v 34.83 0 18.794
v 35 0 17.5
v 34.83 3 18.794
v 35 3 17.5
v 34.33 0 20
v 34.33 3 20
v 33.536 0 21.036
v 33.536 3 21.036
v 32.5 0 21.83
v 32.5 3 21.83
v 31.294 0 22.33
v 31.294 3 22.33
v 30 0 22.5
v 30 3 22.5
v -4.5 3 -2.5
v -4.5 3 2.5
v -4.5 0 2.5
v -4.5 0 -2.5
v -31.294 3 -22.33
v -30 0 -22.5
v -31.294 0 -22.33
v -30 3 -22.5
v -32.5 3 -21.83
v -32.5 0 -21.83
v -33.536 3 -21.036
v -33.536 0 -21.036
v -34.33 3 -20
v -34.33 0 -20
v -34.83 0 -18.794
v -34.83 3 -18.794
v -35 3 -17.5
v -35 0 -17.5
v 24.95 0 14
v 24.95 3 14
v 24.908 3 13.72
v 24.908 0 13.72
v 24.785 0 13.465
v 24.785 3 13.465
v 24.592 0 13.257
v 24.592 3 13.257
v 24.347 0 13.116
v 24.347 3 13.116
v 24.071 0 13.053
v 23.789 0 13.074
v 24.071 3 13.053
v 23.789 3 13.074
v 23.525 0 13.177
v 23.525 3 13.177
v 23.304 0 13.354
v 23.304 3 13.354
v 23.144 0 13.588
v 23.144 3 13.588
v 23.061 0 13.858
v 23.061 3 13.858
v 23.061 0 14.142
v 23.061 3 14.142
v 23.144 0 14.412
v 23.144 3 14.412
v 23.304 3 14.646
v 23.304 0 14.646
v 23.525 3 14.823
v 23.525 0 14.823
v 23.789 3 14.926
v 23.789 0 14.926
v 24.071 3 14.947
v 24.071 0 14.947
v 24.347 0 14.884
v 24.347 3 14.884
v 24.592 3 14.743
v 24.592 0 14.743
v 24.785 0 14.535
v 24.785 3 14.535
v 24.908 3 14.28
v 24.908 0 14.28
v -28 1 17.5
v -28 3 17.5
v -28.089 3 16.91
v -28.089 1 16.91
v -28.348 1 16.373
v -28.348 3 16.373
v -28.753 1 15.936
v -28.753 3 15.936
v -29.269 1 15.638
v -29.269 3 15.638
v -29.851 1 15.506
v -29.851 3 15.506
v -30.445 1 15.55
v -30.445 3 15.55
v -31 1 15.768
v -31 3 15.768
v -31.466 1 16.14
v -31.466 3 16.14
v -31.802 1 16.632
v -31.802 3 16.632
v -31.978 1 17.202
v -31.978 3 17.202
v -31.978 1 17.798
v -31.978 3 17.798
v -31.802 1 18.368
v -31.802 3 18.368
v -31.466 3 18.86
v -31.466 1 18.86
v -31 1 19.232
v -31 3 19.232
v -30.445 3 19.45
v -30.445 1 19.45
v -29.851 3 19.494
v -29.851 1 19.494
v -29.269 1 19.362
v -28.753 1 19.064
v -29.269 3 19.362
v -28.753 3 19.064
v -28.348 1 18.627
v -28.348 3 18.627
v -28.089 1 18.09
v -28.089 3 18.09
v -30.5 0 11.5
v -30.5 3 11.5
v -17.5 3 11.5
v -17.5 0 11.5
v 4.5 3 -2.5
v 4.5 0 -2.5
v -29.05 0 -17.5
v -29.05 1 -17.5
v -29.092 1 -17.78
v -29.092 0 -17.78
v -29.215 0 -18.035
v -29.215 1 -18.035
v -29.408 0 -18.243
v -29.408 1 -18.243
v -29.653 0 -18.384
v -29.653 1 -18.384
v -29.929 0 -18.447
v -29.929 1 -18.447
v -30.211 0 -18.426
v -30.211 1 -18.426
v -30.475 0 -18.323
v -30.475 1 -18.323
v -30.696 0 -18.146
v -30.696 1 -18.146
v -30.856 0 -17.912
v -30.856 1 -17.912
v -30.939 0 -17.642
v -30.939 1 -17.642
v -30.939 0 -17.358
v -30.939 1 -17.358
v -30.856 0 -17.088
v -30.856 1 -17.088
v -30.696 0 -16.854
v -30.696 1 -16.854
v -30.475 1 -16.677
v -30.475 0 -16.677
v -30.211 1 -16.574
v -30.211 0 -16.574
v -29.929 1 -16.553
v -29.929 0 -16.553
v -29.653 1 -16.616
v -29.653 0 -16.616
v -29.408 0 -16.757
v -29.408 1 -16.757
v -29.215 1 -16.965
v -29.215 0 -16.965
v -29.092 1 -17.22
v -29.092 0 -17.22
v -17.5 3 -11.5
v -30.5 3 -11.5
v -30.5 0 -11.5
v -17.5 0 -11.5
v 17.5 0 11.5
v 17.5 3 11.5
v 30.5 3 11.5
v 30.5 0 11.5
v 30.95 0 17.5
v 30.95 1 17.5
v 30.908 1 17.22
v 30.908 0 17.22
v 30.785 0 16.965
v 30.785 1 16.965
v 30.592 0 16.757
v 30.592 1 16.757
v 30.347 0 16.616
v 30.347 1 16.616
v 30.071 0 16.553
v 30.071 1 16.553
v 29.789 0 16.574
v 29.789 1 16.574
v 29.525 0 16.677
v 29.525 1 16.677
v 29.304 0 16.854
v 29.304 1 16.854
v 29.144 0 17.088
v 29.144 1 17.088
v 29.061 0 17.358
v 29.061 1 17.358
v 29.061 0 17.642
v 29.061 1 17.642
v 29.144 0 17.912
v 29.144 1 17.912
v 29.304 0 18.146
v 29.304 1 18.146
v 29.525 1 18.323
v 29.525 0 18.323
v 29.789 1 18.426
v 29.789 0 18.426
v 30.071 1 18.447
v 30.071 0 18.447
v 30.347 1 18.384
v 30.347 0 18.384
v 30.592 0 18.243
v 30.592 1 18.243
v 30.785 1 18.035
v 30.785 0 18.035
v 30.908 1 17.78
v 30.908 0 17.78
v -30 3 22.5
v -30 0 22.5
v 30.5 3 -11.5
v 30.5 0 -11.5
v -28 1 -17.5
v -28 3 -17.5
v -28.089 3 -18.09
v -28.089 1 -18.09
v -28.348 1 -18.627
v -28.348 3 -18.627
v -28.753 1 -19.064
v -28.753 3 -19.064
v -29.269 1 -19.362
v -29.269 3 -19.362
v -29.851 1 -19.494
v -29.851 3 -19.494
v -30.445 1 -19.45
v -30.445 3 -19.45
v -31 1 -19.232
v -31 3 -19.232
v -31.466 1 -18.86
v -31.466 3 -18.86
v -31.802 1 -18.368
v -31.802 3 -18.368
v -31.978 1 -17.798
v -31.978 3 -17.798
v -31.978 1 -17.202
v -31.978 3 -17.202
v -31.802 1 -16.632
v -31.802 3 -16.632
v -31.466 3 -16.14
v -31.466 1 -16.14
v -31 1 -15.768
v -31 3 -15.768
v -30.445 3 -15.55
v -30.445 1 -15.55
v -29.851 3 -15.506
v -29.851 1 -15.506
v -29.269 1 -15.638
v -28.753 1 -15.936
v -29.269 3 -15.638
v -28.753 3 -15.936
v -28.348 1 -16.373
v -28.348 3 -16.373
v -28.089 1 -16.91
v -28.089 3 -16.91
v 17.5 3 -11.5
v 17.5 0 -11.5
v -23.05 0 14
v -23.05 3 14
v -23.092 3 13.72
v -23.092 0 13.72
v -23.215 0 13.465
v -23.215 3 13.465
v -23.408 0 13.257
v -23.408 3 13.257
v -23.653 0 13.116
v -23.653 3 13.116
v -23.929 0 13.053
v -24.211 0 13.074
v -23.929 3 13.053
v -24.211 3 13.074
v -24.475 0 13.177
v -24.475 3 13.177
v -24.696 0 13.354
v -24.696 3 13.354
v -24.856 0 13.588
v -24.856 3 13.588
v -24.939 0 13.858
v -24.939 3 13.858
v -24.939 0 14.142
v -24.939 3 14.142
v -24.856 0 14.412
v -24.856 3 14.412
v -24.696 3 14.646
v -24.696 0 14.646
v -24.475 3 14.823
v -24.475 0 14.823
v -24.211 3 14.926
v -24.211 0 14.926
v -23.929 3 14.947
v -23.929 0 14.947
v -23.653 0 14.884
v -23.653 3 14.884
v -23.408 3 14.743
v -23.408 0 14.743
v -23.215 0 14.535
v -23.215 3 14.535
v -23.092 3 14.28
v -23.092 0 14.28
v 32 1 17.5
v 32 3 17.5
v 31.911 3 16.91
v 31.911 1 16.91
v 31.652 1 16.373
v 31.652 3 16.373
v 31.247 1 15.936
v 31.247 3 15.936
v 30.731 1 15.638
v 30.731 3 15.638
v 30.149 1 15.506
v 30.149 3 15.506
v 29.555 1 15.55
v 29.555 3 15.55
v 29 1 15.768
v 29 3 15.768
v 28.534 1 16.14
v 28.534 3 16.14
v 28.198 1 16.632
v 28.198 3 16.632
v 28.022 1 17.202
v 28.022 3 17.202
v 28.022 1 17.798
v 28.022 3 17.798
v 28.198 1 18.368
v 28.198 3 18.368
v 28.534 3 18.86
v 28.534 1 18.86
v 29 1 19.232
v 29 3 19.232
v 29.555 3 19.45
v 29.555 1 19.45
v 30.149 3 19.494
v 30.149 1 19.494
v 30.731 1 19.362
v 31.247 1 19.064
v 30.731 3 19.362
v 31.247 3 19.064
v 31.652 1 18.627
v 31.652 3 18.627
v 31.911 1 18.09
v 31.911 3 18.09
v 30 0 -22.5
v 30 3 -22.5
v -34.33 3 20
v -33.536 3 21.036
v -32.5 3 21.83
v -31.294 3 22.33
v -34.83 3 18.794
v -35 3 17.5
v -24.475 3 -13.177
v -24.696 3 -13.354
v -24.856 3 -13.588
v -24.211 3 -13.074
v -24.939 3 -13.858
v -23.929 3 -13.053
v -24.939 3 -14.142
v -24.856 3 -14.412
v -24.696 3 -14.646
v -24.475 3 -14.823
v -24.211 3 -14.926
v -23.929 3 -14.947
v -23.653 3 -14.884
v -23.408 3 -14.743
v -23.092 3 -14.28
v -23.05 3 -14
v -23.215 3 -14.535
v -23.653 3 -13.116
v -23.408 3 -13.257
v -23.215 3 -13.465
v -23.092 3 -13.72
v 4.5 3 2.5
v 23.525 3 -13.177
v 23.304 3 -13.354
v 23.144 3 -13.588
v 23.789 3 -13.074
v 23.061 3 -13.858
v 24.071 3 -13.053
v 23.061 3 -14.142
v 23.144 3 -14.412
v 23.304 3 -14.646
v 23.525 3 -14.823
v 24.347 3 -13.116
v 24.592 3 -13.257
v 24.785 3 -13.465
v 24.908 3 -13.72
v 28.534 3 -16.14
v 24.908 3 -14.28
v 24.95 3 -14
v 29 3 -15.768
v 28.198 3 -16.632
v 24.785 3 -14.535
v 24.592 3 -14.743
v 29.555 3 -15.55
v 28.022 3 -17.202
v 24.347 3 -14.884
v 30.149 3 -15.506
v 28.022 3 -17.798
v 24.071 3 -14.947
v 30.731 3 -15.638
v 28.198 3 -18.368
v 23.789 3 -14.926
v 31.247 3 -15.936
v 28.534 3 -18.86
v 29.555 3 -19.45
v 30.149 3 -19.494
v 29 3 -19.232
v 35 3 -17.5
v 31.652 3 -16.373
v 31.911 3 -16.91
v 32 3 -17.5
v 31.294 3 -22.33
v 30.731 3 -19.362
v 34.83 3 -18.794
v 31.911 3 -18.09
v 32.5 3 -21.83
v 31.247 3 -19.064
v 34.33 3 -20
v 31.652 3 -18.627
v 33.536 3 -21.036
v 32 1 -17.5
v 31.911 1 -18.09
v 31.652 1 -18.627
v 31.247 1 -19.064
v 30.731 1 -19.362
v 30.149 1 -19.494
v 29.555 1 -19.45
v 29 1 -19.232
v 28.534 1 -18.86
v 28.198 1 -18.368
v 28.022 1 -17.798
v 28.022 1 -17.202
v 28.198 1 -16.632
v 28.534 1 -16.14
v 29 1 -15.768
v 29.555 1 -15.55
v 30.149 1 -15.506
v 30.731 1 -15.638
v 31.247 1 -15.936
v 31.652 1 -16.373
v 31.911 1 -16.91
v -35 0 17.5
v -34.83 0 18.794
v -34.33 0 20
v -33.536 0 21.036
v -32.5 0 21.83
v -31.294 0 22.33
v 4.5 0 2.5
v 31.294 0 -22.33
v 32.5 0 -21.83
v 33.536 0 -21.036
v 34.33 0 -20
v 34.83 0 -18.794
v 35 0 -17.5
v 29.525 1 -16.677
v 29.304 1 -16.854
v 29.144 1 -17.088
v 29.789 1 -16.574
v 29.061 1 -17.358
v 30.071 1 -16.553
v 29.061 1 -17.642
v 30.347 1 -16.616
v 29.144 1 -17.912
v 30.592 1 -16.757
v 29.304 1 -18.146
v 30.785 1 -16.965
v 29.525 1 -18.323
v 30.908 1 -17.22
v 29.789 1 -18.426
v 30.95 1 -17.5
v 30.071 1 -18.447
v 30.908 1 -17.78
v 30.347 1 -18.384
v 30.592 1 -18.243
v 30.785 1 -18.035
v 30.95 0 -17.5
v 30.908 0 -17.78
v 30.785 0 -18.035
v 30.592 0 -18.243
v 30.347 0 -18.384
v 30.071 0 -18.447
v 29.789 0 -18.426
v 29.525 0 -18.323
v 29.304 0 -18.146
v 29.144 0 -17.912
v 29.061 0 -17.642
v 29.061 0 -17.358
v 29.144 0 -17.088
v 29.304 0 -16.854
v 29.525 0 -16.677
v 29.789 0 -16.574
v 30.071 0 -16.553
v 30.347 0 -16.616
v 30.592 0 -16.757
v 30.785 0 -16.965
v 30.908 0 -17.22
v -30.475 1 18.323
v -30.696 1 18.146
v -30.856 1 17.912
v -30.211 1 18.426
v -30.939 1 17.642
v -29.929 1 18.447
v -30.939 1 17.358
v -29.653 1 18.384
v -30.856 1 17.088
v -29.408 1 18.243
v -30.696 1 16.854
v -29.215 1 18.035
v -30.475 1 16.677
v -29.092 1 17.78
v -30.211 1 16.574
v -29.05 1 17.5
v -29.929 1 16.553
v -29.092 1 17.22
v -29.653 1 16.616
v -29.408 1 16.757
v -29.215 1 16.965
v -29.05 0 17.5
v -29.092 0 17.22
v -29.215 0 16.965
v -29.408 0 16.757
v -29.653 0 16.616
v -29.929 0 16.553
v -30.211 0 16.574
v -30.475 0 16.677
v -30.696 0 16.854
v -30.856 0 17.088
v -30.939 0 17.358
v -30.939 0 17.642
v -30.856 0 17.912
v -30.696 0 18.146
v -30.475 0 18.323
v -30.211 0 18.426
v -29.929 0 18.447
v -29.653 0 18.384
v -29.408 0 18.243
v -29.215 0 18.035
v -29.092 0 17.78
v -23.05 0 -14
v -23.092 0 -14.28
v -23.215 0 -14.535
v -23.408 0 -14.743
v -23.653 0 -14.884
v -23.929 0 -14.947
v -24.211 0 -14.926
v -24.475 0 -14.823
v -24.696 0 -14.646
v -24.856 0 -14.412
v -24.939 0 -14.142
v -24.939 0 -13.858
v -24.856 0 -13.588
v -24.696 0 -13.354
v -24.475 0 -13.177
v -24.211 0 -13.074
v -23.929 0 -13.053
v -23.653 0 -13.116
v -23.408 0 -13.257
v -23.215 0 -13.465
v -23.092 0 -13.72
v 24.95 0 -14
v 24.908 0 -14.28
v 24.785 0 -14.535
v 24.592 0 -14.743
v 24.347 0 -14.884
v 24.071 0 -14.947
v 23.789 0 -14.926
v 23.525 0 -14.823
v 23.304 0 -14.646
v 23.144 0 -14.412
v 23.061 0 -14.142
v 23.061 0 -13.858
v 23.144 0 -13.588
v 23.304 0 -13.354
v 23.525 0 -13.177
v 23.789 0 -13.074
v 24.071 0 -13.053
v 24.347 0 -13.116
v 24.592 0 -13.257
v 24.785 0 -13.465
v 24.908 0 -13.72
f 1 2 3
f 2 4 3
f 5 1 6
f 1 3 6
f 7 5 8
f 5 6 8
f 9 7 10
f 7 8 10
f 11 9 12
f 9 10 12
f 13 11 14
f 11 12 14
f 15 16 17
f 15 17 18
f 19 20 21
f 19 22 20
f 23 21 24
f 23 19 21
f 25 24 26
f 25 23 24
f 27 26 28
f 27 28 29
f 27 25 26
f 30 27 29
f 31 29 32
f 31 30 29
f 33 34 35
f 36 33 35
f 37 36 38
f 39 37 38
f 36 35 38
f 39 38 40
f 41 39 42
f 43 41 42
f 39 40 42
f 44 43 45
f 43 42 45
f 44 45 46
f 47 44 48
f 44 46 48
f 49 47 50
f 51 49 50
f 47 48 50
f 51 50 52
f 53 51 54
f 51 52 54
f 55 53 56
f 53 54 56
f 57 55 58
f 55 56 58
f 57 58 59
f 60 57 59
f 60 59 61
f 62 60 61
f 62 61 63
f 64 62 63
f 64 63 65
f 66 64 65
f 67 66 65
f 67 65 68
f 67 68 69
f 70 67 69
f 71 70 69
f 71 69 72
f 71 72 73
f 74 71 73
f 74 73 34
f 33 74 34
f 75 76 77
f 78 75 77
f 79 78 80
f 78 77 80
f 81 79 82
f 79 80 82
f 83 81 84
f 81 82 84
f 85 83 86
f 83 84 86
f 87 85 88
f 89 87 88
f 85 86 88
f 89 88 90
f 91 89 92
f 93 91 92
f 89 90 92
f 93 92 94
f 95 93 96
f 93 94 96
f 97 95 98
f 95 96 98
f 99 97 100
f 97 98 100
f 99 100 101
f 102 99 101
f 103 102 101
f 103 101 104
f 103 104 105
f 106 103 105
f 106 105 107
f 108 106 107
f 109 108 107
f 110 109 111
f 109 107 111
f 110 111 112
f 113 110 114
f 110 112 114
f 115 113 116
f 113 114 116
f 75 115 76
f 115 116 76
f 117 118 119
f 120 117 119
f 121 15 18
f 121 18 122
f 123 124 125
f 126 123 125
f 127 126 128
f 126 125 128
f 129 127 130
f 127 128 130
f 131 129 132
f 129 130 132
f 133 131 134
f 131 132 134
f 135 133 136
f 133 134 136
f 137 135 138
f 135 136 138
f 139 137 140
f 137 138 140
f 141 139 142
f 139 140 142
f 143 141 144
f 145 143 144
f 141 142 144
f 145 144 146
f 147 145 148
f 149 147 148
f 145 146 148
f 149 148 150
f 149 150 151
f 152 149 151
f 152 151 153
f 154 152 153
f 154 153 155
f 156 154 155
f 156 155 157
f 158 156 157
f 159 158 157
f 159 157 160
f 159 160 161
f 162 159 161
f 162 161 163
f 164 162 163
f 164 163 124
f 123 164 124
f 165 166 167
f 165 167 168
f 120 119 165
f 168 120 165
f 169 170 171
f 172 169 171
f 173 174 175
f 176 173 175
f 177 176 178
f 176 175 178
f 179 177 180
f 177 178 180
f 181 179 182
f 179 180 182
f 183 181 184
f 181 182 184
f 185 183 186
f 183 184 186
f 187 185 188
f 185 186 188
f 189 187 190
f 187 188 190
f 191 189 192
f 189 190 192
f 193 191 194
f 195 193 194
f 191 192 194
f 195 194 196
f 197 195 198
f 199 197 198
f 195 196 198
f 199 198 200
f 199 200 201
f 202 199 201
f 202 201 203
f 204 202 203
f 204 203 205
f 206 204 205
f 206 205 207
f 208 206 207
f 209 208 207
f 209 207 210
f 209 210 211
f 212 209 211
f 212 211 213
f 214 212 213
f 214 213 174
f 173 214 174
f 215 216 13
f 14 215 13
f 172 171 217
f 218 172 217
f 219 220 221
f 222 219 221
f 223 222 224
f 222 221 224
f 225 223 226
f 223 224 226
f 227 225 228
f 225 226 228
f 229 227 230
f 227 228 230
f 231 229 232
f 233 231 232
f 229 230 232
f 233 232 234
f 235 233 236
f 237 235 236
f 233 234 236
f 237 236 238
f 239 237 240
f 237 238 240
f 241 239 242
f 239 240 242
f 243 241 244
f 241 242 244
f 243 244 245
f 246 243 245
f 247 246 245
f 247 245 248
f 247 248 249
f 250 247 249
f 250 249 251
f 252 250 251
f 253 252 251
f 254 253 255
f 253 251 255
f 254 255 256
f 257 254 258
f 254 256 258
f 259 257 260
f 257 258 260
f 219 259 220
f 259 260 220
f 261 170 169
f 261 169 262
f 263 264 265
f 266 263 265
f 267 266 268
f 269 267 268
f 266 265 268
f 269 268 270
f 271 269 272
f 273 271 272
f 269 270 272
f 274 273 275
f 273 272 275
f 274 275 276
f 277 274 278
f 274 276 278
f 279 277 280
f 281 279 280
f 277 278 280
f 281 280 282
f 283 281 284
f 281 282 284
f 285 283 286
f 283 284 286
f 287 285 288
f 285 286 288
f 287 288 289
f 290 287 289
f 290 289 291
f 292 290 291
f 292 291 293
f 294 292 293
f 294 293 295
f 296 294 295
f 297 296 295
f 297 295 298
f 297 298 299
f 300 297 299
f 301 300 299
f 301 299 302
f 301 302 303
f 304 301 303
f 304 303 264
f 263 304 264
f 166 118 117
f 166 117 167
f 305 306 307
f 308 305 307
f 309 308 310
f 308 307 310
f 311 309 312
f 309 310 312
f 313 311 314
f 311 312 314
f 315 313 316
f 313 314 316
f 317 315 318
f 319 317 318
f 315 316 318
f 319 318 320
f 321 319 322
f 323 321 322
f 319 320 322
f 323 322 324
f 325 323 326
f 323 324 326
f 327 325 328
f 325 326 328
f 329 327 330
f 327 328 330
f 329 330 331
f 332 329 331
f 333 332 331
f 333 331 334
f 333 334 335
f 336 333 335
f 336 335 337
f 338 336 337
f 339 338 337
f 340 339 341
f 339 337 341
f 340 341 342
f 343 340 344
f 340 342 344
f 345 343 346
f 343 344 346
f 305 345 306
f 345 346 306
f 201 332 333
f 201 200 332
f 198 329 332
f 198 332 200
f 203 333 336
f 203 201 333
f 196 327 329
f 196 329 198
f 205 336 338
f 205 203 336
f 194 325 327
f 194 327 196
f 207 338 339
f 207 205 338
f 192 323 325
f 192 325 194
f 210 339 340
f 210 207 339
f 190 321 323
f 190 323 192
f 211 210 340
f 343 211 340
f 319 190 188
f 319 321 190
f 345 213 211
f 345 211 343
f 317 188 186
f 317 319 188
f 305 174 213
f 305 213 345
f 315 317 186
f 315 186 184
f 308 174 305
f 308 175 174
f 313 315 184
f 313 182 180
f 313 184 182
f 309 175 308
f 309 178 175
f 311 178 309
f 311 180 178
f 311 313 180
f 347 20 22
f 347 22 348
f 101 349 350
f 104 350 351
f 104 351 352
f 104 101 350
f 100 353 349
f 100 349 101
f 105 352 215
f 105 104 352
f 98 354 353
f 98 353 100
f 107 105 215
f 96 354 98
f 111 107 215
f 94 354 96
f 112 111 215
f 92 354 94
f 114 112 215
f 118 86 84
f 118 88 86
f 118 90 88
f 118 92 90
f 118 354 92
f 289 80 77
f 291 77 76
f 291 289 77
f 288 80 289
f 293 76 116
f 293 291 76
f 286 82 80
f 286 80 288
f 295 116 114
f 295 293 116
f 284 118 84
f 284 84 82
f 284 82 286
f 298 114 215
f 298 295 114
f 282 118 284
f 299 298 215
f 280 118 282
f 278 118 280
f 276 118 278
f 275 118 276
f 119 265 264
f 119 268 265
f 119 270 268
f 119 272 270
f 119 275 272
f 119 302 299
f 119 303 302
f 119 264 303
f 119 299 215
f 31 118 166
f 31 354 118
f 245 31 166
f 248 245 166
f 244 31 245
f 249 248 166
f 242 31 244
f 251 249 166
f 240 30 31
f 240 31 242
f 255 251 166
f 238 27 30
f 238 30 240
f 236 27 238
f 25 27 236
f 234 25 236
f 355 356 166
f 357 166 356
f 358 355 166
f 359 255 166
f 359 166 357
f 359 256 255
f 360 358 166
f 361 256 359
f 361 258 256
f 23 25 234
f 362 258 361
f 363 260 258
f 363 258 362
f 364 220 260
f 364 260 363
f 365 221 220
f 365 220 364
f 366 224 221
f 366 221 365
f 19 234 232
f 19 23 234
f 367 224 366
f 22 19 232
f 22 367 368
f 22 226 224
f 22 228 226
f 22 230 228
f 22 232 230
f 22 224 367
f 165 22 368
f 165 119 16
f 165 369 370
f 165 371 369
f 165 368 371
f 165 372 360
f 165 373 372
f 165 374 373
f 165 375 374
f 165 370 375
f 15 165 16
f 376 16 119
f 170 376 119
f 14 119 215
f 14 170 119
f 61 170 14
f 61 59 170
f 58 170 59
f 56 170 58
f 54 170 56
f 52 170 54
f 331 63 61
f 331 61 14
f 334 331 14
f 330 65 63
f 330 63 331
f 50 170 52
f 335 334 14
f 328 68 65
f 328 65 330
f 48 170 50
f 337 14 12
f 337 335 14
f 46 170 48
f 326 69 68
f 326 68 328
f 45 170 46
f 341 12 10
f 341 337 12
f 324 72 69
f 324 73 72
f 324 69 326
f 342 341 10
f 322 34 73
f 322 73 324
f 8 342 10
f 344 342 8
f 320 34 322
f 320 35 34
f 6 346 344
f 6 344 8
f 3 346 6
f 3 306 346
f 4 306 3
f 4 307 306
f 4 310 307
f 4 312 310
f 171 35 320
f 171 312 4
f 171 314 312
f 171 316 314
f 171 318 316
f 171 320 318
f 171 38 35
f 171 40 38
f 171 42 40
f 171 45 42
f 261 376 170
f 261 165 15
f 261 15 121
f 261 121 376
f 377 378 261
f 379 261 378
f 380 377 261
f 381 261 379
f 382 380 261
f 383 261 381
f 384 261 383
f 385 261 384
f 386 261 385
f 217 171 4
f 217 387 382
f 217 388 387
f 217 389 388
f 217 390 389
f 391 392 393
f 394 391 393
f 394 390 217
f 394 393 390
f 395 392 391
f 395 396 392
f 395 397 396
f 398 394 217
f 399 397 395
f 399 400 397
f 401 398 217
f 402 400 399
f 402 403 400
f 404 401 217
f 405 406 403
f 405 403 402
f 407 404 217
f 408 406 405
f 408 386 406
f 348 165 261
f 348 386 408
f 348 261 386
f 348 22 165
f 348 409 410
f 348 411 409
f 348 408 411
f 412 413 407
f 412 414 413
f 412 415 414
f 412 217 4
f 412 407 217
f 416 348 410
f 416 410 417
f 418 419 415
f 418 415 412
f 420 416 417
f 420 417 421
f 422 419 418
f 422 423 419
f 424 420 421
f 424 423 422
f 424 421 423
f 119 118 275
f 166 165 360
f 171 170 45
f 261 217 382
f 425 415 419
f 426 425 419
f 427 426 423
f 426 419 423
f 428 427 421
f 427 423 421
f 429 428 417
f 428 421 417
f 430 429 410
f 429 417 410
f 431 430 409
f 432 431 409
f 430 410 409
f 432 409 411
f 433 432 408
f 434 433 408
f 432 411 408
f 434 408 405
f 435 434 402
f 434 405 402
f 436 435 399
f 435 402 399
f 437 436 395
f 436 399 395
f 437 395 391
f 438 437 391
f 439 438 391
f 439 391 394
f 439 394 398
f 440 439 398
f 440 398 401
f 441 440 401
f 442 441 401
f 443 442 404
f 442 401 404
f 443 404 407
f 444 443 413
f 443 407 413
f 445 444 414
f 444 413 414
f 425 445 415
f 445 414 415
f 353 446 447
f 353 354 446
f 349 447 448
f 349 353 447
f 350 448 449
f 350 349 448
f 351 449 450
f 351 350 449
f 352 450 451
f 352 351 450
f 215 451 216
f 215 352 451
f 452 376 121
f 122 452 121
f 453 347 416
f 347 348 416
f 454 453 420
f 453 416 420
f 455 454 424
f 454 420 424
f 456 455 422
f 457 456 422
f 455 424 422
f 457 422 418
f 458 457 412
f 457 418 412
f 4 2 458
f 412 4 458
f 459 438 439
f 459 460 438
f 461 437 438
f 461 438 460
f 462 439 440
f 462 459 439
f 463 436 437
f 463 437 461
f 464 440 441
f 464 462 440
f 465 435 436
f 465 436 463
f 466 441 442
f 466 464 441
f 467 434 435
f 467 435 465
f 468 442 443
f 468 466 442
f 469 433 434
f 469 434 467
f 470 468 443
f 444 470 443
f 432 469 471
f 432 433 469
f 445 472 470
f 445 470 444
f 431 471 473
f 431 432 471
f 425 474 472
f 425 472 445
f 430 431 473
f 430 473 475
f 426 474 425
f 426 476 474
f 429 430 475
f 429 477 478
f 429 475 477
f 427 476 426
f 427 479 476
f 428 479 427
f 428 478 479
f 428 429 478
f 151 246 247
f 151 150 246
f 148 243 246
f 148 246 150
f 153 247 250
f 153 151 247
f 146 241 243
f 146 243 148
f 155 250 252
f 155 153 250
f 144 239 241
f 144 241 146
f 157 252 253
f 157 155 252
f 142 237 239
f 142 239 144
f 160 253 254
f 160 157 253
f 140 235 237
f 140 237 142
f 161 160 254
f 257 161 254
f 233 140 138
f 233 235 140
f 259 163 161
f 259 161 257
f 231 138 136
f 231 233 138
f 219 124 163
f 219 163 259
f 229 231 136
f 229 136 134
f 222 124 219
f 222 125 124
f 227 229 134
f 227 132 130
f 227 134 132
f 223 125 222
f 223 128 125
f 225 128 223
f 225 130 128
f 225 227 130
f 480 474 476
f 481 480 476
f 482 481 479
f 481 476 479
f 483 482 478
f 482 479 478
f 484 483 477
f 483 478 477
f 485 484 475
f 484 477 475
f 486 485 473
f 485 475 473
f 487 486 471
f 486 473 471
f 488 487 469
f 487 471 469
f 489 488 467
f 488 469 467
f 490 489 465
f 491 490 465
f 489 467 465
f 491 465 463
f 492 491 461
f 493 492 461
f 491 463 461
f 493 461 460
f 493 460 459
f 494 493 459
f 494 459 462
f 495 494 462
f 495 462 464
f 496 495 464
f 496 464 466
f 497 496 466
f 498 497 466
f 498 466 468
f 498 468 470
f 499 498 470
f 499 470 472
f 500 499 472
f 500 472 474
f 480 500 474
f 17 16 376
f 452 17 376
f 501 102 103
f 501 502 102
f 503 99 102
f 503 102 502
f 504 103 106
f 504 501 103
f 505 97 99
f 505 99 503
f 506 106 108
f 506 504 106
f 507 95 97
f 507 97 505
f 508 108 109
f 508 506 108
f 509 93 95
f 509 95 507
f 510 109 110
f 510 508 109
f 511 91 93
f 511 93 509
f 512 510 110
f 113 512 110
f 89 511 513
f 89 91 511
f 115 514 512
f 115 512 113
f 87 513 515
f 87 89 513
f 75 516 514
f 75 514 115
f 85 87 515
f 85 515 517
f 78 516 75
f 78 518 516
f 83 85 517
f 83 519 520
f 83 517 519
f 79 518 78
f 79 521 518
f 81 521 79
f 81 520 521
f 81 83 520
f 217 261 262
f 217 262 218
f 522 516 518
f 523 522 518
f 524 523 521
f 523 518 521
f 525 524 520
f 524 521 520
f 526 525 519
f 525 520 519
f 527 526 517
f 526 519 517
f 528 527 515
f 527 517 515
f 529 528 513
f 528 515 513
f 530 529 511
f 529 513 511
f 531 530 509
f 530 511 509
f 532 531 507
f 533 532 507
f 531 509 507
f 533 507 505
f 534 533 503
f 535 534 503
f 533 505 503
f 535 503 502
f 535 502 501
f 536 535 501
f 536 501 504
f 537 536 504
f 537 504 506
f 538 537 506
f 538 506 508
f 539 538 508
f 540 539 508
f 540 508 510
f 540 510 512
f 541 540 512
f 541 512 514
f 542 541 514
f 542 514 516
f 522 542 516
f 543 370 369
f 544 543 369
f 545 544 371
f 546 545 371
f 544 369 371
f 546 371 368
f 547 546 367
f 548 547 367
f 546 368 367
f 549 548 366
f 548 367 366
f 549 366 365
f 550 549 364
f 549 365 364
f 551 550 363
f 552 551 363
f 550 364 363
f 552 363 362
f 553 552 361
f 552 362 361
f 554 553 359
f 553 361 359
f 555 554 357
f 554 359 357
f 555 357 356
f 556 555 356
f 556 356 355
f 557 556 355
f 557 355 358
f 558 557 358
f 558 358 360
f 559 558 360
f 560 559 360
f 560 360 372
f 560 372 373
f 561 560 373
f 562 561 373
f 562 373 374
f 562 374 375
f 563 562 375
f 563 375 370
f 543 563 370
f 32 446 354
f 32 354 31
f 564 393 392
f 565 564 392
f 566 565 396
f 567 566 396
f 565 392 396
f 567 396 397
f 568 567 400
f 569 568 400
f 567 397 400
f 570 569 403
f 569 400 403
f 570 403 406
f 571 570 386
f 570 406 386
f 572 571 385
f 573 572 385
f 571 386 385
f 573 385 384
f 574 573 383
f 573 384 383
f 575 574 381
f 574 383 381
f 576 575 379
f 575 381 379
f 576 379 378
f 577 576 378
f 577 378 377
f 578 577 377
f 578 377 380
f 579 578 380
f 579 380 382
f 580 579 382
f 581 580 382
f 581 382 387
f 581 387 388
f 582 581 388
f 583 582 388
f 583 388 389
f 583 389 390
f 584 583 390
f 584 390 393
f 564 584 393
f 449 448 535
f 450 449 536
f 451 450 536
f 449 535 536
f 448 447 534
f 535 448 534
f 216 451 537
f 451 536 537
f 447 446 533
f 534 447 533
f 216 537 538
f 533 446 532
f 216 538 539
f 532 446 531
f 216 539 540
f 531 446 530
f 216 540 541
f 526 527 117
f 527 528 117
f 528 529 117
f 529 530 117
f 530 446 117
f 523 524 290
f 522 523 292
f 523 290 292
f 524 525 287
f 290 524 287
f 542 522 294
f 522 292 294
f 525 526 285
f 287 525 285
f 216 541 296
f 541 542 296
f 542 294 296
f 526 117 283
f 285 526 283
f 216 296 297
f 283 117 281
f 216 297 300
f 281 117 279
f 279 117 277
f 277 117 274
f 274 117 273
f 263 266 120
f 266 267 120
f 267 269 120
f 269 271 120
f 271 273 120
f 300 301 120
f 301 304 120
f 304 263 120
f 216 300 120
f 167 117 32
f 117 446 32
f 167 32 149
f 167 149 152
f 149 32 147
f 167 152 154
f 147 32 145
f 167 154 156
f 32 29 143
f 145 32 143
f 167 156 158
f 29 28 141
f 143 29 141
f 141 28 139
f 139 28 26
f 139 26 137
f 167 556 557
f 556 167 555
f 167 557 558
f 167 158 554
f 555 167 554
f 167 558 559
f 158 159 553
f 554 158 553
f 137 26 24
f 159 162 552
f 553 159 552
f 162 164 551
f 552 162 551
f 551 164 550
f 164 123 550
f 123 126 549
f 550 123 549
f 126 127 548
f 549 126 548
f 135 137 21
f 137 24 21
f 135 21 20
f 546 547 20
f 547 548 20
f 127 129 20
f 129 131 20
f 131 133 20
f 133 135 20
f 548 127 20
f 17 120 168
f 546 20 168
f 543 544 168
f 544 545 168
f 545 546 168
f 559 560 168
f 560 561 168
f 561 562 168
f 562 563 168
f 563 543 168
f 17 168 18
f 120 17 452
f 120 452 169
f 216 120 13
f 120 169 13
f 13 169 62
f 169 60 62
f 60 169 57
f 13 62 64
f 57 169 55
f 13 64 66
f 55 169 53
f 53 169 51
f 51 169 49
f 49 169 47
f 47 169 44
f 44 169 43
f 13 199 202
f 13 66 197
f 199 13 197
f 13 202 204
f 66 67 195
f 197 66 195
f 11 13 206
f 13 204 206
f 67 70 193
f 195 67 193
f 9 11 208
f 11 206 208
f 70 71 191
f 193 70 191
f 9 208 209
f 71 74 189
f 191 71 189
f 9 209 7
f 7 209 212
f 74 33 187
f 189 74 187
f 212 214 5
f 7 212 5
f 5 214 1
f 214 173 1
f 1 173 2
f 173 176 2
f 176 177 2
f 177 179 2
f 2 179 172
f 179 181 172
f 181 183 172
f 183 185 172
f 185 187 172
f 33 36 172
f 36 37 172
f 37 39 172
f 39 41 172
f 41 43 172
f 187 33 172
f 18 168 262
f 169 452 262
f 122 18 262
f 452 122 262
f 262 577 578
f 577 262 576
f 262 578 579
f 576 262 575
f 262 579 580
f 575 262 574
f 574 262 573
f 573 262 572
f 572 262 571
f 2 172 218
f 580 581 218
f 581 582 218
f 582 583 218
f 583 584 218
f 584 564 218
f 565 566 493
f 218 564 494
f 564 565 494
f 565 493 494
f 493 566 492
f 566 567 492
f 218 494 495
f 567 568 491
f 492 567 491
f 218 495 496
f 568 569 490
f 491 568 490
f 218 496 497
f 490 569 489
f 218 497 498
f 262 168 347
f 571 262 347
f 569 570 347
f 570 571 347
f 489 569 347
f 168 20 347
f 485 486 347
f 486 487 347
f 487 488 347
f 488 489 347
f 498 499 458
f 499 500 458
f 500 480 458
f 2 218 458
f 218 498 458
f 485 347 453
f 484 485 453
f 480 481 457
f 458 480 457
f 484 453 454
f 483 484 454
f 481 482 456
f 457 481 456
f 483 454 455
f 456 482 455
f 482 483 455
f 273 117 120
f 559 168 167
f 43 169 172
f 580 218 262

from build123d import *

# Parameters (mm, degrees)
SKETCH_1_W          = 70
SKETCH_1_H          = 45
EXTRUDE_1_DEPTH     = 3
SKETCH_2_W          = 13
SKETCH_2_H          = 23
CUT_EXTRUDE_1_DEPTH = 10
SKETCH_3_R          = 0.95
CUT_EXTRUDE_2_DEPTH = 10
FILLET_1_R          = 5
FILLET_2_R          = 5
SKETCH_4_R          = 0.95
CUT_EXTRUDE_3_DEPTH = 10
SKETCH_5_R          = 2
CUT_EXTRUDE_4_DEPTH = 2
SKETCH_6_W          = 9
SKETCH_6_H          = 5
CUT_EXTRUDE_5_DEPTH = 14


with BuildPart() as part:
    # 草图1 → 凸台-拉伸1 (new body)
    with BuildSketch(Plane(origin=(0, 0, 0), x_dir=(1, 0, 0), z_dir=(0, 1, 0))):
        Rectangle(SKETCH_1_W, SKETCH_1_H)
    extrude(amount=EXTRUDE_1_DEPTH)

    # 草图2 → 切除-拉伸1 (cut)
    with BuildSketch(Plane(origin=(0, 3, 0), x_dir=(1, 0, 0), z_dir=(0, 1, 0))):
        with Locations((24, 0)):
            Rectangle(SKETCH_2_W, SKETCH_2_H)
        with Locations((-24, 0)):
            Rectangle(SKETCH_2_W, SKETCH_2_H)
    extrude(amount=-CUT_EXTRUDE_1_DEPTH, mode=Mode.SUBTRACT)

    # 草图3 → 切除-拉伸2 (cut)
    with BuildSketch(Plane(origin=(0, 3, 0), x_dir=(1, 0, 0), z_dir=(0, 1, 0))):
        with Locations((-24, 14)):
            Circle(SKETCH_3_R)
        with Locations((-24, -14)):
            Circle(SKETCH_3_R)
        with Locations((24, 14)):
            Circle(SKETCH_3_R)
        with Locations((24, -14)):
            Circle(SKETCH_3_R)
    extrude(amount=-CUT_EXTRUDE_2_DEPTH, mode=Mode.SUBTRACT)

    # 圆角1
    fillet_1_edges = [part.edges().sort_by_distance(p)[0] for p in [
        (35, 1.5, -22.5),
    ]]
    fillet(fillet_1_edges, radius=FILLET_1_R)

    # 圆角2
    fillet_2_edges = [part.edges().sort_by_distance(p)[0] for p in [
        (35, 1.5, 22.5),
        (-35, 1.5, 22.5),
        (-35, 1.5, -22.5),
    ]]
    fillet(fillet_2_edges, radius=FILLET_2_R)

    # 草图4 → 切除-拉伸3 (cut)
    with BuildSketch(Plane(origin=(0, 3, 0), x_dir=(1, 0, 0), z_dir=(0, 1, 0))):
        with Locations((-30, 17.5)):
            Circle(SKETCH_4_R)
        with Locations((30, 17.5)):
            Circle(SKETCH_4_R)
        with Locations((-30, -17.5)):
            Circle(SKETCH_4_R)
        with Locations((30, -17.5)):
            Circle(SKETCH_4_R)
    extrude(amount=-CUT_EXTRUDE_3_DEPTH, mode=Mode.SUBTRACT)

    # 草图5 → 切除-拉伸4 (cut)
    with BuildSketch(Plane(origin=(0, 3, 0), x_dir=(1, 0, 0), z_dir=(0, 1, 0))):
        with Locations((-30, 17.5)):
            Circle(SKETCH_5_R)
        with Locations((30, 17.5)):
            Circle(SKETCH_5_R)
        with Locations((-30, -17.5)):
            Circle(SKETCH_5_R)
        with Locations((30, -17.5)):
            Circle(SKETCH_5_R)
    extrude(amount=-CUT_EXTRUDE_4_DEPTH, mode=Mode.SUBTRACT)

    # 草图6 → 切除-拉伸5 (cut)
    with BuildSketch(Plane(origin=(0, 3, 0), x_dir=(1, 0, 0), z_dir=(0, 1, 0))):
        Rectangle(SKETCH_6_W, SKETCH_6_H)
    extrude(amount=-CUT_EXTRUDE_5_DEPTH, mode=Mode.SUBTRACT)


solid = part.part
